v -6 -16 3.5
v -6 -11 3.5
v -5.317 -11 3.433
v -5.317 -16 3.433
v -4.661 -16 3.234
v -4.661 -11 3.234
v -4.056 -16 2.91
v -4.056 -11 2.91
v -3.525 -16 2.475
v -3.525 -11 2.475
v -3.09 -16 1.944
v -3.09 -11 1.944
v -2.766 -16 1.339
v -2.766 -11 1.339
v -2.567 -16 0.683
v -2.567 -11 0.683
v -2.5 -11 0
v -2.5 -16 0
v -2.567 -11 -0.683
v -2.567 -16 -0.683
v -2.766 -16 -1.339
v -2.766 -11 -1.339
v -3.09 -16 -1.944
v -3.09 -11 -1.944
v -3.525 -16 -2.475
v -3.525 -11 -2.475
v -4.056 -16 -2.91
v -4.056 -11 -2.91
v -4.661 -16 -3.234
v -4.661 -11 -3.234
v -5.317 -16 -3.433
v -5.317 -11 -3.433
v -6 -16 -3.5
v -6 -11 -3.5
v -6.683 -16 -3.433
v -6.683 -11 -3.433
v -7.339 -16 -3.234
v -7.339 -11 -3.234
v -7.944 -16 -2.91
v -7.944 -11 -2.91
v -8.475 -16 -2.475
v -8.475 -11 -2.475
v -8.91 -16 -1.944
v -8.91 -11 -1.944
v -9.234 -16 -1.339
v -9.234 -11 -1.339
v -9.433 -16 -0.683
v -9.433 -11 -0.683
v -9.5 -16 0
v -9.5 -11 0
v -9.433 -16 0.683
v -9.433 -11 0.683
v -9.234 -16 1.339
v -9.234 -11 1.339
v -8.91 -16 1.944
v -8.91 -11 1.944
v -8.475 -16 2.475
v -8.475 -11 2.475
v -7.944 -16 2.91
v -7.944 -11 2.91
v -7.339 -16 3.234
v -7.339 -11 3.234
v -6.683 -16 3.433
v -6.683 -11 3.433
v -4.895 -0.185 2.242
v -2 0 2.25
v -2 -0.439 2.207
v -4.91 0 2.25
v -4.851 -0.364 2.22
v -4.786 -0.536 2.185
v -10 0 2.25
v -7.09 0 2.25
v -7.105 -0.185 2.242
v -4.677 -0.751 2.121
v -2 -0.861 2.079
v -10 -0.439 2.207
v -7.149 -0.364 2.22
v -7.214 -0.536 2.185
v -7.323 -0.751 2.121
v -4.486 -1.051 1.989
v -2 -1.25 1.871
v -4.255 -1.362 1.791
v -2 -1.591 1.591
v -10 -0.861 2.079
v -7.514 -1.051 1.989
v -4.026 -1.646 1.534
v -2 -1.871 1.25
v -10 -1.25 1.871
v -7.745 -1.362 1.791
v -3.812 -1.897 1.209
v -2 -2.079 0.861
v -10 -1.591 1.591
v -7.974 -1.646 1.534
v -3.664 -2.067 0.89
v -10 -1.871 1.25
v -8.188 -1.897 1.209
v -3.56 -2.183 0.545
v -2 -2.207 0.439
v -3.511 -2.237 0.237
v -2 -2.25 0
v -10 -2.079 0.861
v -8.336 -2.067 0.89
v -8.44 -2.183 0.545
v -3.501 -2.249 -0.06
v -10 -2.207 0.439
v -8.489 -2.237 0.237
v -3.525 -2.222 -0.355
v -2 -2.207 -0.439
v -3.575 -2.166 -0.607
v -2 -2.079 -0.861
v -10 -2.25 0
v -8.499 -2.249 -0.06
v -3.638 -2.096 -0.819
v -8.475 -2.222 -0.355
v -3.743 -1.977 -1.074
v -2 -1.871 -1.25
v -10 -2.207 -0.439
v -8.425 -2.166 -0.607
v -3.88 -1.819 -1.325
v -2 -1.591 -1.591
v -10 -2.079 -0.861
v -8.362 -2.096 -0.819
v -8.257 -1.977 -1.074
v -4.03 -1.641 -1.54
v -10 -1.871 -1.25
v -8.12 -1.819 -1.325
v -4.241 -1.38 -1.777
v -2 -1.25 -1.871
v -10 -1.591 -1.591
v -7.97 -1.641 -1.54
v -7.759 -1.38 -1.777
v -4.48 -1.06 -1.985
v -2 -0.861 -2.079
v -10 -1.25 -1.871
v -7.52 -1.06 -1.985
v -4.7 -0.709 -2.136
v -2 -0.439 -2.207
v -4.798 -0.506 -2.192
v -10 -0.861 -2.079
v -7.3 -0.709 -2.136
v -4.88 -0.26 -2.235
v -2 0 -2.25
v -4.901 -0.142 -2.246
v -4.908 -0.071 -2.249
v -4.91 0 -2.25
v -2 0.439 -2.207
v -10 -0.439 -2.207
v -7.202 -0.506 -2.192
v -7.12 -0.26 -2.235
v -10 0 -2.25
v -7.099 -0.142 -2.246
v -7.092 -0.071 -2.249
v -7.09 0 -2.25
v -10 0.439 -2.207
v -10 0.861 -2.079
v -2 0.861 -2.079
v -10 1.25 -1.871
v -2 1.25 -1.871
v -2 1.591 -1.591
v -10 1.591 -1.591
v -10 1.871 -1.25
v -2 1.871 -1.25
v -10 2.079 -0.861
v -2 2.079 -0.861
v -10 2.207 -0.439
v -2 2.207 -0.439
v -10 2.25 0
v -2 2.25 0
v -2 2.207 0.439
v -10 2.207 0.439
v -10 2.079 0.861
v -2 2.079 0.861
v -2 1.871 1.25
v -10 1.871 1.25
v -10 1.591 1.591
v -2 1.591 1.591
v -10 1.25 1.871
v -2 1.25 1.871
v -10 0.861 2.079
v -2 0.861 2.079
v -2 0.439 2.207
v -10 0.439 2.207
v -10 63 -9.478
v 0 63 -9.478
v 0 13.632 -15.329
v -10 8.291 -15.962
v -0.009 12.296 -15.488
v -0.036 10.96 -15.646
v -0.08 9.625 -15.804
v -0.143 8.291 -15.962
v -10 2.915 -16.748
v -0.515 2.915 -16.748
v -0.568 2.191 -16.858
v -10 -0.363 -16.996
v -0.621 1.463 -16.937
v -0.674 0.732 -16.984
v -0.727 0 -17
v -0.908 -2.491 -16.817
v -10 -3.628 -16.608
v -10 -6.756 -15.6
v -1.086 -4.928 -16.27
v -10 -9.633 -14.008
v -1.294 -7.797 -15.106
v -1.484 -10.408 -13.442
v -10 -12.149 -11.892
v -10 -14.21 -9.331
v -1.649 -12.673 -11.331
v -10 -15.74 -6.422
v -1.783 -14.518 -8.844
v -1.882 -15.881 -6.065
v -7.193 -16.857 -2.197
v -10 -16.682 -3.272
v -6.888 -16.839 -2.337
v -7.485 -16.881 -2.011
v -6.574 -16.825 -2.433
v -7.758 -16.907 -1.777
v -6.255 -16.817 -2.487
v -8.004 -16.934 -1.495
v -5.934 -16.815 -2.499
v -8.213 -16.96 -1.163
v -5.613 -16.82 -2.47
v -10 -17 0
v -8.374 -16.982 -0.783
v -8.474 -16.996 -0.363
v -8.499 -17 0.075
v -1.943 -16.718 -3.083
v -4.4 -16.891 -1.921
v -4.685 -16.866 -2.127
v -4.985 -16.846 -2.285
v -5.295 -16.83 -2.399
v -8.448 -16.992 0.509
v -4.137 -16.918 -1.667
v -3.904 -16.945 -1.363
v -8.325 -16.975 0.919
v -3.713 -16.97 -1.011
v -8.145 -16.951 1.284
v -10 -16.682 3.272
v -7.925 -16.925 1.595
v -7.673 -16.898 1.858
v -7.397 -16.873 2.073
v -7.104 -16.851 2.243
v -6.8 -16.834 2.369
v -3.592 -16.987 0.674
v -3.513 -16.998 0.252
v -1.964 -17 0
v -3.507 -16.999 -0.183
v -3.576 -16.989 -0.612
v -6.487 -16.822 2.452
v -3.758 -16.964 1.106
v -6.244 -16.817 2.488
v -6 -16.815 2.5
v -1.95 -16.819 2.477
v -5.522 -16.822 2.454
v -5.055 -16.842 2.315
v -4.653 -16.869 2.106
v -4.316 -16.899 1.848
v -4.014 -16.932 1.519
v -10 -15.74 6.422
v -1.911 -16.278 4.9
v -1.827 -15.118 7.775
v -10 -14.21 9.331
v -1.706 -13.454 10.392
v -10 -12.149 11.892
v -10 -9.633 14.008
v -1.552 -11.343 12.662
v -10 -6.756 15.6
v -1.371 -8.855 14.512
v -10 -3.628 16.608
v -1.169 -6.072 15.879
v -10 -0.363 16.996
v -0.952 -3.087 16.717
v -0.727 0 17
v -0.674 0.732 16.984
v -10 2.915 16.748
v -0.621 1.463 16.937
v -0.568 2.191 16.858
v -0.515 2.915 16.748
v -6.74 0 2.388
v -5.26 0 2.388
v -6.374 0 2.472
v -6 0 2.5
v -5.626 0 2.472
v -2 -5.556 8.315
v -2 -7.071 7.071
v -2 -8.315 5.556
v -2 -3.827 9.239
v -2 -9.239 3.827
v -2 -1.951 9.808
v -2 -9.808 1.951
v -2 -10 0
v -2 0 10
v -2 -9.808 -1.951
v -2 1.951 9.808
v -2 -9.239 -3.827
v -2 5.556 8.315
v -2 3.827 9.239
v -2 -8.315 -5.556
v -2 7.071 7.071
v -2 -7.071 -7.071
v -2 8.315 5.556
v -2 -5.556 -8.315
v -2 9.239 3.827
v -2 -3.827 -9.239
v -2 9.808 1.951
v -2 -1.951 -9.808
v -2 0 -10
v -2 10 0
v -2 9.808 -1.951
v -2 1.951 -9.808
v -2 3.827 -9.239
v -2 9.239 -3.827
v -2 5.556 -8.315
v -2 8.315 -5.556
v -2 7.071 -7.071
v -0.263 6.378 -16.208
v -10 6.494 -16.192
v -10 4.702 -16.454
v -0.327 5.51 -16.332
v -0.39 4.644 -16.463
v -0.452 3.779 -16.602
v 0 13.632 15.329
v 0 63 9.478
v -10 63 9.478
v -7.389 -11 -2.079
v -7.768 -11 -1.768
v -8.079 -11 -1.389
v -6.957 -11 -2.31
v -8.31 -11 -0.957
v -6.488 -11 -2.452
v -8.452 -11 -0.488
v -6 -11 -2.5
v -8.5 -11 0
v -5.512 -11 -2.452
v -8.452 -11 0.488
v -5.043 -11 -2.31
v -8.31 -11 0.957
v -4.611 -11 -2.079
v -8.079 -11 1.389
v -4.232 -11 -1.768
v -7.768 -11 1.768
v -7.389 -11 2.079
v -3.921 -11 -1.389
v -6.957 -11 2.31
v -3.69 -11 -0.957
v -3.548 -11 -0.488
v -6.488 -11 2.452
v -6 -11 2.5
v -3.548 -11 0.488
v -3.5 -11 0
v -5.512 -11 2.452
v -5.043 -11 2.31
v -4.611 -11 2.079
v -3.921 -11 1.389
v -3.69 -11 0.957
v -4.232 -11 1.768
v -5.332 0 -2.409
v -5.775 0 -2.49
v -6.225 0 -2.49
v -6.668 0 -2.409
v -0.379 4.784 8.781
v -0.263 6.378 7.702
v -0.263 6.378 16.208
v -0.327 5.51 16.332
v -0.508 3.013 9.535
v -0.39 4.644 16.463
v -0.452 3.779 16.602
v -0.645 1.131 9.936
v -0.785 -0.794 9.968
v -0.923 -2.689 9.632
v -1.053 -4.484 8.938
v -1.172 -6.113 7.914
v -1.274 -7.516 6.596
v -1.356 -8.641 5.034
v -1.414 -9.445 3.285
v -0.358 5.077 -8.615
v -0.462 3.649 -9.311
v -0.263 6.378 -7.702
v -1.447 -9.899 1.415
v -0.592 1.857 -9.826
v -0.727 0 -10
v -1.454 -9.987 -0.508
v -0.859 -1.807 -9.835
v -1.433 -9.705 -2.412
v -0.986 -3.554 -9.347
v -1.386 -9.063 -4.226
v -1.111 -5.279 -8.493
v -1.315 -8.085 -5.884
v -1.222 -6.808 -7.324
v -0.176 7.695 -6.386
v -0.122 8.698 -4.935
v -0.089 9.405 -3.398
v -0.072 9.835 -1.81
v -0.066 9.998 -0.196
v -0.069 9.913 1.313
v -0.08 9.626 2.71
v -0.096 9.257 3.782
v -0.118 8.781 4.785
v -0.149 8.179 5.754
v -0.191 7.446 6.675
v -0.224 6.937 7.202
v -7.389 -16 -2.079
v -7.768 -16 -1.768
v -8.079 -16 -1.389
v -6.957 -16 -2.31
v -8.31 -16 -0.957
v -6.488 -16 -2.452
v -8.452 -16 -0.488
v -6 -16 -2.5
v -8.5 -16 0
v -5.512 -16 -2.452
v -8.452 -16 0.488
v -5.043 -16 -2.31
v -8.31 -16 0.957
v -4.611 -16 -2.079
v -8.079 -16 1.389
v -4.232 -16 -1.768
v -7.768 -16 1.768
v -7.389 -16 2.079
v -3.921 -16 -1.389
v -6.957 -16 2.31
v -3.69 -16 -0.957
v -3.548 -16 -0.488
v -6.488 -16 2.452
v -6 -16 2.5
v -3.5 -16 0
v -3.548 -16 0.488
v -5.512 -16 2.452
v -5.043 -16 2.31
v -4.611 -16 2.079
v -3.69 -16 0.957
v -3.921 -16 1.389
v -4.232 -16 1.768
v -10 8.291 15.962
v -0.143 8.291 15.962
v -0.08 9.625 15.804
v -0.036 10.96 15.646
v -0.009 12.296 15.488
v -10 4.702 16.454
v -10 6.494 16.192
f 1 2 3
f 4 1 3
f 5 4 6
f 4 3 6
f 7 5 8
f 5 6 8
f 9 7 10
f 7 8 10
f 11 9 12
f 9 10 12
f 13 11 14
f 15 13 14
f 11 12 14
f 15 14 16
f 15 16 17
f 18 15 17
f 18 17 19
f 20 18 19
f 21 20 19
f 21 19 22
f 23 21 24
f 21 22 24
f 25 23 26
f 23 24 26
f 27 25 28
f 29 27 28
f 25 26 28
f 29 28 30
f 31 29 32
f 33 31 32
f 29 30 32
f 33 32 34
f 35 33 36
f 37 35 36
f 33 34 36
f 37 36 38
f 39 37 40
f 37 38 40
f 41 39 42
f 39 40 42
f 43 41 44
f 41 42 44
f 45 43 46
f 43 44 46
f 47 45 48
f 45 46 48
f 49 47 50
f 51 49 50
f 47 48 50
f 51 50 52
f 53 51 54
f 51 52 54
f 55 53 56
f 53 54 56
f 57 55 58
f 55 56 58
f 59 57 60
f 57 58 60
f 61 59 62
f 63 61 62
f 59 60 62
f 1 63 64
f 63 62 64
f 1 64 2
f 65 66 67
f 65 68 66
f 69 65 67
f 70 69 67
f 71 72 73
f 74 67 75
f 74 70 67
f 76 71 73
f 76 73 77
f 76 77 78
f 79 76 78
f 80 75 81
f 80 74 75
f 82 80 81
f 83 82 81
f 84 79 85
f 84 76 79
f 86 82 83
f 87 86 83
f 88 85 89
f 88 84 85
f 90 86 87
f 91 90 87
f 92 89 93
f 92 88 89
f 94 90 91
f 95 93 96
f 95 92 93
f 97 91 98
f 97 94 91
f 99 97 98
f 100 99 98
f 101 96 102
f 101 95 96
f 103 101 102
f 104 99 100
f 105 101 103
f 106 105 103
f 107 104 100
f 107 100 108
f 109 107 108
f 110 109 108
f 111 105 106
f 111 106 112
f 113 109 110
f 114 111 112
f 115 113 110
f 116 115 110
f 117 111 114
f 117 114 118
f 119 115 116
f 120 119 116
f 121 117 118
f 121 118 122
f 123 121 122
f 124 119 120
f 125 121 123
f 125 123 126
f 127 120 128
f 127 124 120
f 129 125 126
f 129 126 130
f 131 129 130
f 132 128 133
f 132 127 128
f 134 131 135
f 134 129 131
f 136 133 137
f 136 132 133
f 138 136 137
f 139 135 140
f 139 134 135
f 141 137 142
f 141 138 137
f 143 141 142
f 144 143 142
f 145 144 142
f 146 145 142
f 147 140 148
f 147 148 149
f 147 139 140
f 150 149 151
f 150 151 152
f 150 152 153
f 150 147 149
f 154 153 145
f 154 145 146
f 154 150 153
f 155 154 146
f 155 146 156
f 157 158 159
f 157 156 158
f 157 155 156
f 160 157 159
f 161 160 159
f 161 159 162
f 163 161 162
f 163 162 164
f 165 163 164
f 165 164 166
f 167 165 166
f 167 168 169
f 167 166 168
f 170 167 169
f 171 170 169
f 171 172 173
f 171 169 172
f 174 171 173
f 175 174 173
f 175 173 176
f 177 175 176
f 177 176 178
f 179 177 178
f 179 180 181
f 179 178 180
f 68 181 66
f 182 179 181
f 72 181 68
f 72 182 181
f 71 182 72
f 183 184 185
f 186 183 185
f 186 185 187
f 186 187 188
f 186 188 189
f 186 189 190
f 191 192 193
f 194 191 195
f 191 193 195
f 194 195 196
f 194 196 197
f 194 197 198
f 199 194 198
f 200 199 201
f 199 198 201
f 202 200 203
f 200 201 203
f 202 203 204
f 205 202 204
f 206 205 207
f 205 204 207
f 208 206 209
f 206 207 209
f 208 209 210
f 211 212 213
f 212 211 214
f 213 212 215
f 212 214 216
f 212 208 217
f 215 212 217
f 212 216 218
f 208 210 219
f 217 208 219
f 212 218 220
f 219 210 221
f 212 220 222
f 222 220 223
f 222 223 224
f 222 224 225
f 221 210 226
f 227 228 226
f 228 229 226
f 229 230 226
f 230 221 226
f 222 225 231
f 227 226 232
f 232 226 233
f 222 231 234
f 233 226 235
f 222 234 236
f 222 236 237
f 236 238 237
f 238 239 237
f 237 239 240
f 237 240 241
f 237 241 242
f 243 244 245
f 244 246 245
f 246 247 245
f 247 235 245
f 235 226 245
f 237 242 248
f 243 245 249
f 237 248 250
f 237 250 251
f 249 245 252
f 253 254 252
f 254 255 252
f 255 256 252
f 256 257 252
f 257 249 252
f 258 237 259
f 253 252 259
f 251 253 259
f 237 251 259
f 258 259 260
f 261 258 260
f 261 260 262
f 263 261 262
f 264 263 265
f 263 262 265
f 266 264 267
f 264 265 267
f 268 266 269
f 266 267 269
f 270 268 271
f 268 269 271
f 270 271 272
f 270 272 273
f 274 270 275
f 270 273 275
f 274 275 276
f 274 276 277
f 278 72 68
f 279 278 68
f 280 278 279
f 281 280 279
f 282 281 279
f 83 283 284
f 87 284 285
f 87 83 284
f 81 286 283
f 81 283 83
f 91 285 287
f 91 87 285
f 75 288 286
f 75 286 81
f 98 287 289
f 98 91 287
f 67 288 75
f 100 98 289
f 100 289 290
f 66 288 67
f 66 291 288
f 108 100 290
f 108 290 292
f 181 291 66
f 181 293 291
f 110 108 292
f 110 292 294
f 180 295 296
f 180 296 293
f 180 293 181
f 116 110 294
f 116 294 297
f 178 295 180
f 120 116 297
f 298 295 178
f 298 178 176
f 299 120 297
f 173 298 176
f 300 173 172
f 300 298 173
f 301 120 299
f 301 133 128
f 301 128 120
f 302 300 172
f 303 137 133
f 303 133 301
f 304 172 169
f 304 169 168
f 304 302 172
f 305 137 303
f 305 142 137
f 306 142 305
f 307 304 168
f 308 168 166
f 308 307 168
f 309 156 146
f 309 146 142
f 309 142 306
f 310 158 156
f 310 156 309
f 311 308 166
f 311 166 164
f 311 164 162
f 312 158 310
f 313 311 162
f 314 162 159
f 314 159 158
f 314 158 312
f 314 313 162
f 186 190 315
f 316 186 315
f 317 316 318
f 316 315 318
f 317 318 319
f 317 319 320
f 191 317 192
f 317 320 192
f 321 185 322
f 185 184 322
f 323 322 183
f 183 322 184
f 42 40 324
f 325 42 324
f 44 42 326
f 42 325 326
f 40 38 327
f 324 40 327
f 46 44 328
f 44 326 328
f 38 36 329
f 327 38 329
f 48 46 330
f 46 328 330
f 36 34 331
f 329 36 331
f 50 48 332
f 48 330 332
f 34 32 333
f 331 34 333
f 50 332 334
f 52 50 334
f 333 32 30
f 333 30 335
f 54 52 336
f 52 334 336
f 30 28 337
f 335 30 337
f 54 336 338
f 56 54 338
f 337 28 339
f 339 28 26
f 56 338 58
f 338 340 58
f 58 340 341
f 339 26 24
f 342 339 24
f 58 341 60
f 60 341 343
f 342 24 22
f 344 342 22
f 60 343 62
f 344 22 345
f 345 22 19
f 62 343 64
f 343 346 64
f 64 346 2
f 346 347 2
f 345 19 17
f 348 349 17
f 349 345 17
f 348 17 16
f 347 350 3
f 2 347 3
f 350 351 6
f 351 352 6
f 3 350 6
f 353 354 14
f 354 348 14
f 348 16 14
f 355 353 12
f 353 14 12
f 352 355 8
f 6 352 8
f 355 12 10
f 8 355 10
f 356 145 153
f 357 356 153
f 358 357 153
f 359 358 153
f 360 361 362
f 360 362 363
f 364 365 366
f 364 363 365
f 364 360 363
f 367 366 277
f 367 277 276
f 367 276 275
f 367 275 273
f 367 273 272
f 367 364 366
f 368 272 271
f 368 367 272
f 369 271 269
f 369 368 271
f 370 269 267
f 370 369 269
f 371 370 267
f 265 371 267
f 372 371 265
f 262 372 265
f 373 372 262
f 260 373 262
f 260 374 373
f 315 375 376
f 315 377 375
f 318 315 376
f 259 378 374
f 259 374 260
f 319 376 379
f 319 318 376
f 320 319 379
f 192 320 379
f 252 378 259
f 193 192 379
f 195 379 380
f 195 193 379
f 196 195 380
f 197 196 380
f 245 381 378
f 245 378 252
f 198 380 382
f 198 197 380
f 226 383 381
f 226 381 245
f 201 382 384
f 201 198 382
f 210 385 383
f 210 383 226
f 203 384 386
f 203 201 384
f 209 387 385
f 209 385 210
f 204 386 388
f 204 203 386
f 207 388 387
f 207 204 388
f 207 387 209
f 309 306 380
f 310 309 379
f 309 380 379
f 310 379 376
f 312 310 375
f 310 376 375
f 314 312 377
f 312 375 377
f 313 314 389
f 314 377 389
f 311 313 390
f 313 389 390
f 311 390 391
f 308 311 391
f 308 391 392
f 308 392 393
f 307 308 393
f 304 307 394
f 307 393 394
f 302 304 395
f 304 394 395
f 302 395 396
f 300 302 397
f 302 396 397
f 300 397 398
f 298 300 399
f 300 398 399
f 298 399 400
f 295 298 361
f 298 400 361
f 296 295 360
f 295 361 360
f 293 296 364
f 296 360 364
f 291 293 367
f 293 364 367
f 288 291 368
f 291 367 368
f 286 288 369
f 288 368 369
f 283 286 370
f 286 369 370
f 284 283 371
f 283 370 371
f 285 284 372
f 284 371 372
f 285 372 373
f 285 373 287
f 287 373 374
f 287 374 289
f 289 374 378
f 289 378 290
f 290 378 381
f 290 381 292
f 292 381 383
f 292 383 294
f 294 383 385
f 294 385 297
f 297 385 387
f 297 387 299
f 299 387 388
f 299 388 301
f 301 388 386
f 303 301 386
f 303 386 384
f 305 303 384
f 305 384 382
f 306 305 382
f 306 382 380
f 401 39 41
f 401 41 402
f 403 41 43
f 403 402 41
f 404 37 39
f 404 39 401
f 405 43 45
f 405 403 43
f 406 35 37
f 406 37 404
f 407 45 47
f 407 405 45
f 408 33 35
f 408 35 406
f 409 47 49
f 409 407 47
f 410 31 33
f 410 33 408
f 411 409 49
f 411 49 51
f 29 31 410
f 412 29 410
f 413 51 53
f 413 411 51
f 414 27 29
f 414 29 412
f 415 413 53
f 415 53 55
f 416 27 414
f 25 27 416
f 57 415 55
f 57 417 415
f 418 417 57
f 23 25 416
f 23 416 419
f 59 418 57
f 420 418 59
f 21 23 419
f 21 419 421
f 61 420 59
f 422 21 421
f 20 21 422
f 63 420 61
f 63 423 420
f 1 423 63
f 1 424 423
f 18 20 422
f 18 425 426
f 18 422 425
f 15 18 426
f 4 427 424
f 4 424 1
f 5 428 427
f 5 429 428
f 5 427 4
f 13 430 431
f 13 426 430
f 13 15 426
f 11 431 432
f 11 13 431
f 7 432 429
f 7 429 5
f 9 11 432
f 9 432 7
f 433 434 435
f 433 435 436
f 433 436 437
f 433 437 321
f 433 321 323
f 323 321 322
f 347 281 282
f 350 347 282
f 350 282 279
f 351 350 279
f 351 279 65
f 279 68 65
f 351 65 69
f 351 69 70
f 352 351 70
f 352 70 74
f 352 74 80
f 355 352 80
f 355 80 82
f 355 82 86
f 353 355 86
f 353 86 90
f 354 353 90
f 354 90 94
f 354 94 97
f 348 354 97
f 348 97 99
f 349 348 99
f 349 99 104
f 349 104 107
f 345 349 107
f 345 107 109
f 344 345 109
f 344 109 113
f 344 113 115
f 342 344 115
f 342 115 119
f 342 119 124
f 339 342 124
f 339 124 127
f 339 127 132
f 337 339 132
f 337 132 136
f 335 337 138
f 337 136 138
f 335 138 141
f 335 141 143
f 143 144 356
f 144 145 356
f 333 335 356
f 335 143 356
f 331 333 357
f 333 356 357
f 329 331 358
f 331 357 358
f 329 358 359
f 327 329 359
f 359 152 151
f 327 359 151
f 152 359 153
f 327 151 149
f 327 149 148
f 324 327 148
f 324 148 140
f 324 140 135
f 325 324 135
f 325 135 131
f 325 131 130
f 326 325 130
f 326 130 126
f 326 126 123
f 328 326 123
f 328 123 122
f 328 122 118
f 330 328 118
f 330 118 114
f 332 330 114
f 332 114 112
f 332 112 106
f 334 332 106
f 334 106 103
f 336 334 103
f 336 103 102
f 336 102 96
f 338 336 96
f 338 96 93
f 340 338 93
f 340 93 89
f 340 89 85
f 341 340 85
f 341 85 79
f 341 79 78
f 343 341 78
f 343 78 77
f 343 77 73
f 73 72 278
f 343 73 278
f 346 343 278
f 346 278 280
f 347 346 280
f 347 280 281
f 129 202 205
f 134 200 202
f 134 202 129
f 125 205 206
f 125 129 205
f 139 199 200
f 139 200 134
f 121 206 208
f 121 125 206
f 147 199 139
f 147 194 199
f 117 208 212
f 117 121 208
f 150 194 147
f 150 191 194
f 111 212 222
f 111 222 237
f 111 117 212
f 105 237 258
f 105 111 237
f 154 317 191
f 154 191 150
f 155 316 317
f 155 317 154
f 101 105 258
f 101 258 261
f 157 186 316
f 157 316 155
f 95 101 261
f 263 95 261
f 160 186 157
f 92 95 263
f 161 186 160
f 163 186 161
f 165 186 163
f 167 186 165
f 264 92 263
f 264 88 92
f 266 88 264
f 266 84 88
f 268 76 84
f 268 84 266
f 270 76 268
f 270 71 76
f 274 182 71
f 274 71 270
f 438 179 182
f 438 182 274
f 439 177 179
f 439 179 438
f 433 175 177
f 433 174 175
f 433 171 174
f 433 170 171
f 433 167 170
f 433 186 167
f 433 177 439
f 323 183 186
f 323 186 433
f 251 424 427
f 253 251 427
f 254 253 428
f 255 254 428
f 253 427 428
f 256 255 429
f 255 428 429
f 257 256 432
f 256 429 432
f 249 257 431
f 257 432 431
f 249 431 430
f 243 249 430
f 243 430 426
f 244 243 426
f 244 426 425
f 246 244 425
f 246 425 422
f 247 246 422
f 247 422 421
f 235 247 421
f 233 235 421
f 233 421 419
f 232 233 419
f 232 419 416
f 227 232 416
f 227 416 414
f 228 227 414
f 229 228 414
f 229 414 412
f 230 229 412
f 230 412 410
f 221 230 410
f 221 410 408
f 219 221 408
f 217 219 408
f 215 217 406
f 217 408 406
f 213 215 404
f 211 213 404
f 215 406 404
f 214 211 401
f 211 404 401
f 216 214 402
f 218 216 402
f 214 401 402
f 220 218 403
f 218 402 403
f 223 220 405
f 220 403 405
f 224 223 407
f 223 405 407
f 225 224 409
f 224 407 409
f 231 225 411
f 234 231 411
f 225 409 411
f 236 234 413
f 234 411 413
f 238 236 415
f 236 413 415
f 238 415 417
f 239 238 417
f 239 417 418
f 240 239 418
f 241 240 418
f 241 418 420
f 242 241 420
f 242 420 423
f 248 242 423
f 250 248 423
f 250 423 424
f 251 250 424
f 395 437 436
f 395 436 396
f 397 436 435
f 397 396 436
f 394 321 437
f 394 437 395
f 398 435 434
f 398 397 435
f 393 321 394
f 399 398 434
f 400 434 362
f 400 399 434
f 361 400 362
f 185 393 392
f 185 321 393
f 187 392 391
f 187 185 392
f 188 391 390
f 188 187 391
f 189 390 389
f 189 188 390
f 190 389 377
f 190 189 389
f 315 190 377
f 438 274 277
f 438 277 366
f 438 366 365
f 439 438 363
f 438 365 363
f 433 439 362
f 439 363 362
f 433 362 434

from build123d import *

# Parameters (mm, degrees)
SALIENTE_EXTRUIR1_DEPTH    = 10
CROQUIS3_R                 = 10
CORTAR_EXTRUIR1_DEPTH      = 2
CORTAR_EXTRUIR4_START      = -17
CORTAR_EXTRUIR4_DEPTH      = 34
CORTAR_EXTRUIR5_DEPTH      = 66.741919668
CORTAR_EXTRUIR5_DEPTH_BACK = 10
CROQUIS7_R                 = 2.25
CROQUIS8_R                 = 2.5
CORTAR_EXTRUIR6_DEPTH      = 19
CORTAR_EXTRUIR19_START     = -11
CROQUIS12_R                = 3.5
CORTAR_EXTRUIR19_DEPTH     = 5


# Read off the part's stored shape, not the designer's step: Cortar-Extruir4
with BuildPart() as part:
    # Croquis1 → Saliente-Extruir1 (new body)
    with BuildSketch(Plane(origin=(0, 0, 0), x_dir=(0, 0, -1), z_dir=(1, 0, 0))):
        with BuildLine():
            Line((-15.962347901, 8.291103532), (-9.477641645, 63))
            Line((-9.477641645, 63), (9.477641645, 63))
            Line((9.477641645, 63), (15.962347901, 8.291103532))
            ThreePointArc((15.962347901, 8.291103532), (16.318766271, 5.597695791), (16.748223211, 2.914964711))
            ThreePointArc((16.748223211, 2.914964711), (0, -17), (-16.748223211, 2.914964711))
            ThreePointArc((-16.748223211, 2.914964711), (-16.318766271, 5.597695791), (-15.962347901, 8.291103532))
        make_face()
    extrude(amount=-SALIENTE_EXTRUIR1_DEPTH)

    # Croquis3 → Cortar-Extruir1 (cut)
    with BuildSketch(Plane(origin=(0, 0, 0), x_dir=(0, 0, -1), z_dir=(1, 0, 0))):
        Circle(CROQUIS3_R)
    extrude(amount=-CORTAR_EXTRUIR1_DEPTH, mode=Mode.SUBTRACT)

    # Cortar-Extruir4 outline → Cortar-Extruir4 (cut)
    with BuildSketch(Plane.XY.offset(CORTAR_EXTRUIR4_START)):
        with BuildLine():
            ThreePointArc((0, 13.631567896), (-0.065876274, 10.002392341), (-0.263418304, 6.377998318))
            Line((-0.263418304, 6.377998318), (-1.963636364, -17))
            Line((-1.963636364, -17), (-2.109090909, -19))
            Line((-2.109090909, -19), (0, -19))
            Line((0, -19), (0, 13.631567896))
        make_face()
    extrude(amount=CORTAR_EXTRUIR4_DEPTH, mode=Mode.SUBTRACT)

    # Croquis7 → Cortar-Extruir5 (cut, two sides: drawn at the far end of the back side and taken through both)
    with BuildSketch(Plane(origin=(-2, 0, 0), x_dir=(0, 0, -1), z_dir=(1, 0, 0)).offset(-CORTAR_EXTRUIR5_DEPTH_BACK)):
        with Locations(Location((0, 0, 0), (0, 0, 180))):
            Circle(CROQUIS7_R)
    extrude(amount=CORTAR_EXTRUIR5_DEPTH + CORTAR_EXTRUIR5_DEPTH_BACK, mode=Mode.SUBTRACT)

    # Croquis8 → Cortar-Extruir6 (cut)
    with BuildSketch(Plane(origin=(0, 0, 0), x_dir=(1, 0, 0), z_dir=(0, 1, 0))):
        with Locations(Location((-6, 0, 0), (0, 0, 270))):
            Circle(CROQUIS8_R)
    extrude(amount=-CORTAR_EXTRUIR6_DEPTH, mode=Mode.SUBTRACT)

    # Croquis12 → Cortar-Extruir19 (cut)
    with BuildSketch(Plane(origin=(0, 0, 0), x_dir=(1, 0, 0), z_dir=(0, 1, 0)).offset(CORTAR_EXTRUIR19_START)):
        with Locations(Location((-6, 0, 0), (0, 0, 270))):
            Circle(CROQUIS12_R)
    extrude(amount=-CORTAR_EXTRUIR19_DEPTH, mode=Mode.SUBTRACT)


solid = part.part
